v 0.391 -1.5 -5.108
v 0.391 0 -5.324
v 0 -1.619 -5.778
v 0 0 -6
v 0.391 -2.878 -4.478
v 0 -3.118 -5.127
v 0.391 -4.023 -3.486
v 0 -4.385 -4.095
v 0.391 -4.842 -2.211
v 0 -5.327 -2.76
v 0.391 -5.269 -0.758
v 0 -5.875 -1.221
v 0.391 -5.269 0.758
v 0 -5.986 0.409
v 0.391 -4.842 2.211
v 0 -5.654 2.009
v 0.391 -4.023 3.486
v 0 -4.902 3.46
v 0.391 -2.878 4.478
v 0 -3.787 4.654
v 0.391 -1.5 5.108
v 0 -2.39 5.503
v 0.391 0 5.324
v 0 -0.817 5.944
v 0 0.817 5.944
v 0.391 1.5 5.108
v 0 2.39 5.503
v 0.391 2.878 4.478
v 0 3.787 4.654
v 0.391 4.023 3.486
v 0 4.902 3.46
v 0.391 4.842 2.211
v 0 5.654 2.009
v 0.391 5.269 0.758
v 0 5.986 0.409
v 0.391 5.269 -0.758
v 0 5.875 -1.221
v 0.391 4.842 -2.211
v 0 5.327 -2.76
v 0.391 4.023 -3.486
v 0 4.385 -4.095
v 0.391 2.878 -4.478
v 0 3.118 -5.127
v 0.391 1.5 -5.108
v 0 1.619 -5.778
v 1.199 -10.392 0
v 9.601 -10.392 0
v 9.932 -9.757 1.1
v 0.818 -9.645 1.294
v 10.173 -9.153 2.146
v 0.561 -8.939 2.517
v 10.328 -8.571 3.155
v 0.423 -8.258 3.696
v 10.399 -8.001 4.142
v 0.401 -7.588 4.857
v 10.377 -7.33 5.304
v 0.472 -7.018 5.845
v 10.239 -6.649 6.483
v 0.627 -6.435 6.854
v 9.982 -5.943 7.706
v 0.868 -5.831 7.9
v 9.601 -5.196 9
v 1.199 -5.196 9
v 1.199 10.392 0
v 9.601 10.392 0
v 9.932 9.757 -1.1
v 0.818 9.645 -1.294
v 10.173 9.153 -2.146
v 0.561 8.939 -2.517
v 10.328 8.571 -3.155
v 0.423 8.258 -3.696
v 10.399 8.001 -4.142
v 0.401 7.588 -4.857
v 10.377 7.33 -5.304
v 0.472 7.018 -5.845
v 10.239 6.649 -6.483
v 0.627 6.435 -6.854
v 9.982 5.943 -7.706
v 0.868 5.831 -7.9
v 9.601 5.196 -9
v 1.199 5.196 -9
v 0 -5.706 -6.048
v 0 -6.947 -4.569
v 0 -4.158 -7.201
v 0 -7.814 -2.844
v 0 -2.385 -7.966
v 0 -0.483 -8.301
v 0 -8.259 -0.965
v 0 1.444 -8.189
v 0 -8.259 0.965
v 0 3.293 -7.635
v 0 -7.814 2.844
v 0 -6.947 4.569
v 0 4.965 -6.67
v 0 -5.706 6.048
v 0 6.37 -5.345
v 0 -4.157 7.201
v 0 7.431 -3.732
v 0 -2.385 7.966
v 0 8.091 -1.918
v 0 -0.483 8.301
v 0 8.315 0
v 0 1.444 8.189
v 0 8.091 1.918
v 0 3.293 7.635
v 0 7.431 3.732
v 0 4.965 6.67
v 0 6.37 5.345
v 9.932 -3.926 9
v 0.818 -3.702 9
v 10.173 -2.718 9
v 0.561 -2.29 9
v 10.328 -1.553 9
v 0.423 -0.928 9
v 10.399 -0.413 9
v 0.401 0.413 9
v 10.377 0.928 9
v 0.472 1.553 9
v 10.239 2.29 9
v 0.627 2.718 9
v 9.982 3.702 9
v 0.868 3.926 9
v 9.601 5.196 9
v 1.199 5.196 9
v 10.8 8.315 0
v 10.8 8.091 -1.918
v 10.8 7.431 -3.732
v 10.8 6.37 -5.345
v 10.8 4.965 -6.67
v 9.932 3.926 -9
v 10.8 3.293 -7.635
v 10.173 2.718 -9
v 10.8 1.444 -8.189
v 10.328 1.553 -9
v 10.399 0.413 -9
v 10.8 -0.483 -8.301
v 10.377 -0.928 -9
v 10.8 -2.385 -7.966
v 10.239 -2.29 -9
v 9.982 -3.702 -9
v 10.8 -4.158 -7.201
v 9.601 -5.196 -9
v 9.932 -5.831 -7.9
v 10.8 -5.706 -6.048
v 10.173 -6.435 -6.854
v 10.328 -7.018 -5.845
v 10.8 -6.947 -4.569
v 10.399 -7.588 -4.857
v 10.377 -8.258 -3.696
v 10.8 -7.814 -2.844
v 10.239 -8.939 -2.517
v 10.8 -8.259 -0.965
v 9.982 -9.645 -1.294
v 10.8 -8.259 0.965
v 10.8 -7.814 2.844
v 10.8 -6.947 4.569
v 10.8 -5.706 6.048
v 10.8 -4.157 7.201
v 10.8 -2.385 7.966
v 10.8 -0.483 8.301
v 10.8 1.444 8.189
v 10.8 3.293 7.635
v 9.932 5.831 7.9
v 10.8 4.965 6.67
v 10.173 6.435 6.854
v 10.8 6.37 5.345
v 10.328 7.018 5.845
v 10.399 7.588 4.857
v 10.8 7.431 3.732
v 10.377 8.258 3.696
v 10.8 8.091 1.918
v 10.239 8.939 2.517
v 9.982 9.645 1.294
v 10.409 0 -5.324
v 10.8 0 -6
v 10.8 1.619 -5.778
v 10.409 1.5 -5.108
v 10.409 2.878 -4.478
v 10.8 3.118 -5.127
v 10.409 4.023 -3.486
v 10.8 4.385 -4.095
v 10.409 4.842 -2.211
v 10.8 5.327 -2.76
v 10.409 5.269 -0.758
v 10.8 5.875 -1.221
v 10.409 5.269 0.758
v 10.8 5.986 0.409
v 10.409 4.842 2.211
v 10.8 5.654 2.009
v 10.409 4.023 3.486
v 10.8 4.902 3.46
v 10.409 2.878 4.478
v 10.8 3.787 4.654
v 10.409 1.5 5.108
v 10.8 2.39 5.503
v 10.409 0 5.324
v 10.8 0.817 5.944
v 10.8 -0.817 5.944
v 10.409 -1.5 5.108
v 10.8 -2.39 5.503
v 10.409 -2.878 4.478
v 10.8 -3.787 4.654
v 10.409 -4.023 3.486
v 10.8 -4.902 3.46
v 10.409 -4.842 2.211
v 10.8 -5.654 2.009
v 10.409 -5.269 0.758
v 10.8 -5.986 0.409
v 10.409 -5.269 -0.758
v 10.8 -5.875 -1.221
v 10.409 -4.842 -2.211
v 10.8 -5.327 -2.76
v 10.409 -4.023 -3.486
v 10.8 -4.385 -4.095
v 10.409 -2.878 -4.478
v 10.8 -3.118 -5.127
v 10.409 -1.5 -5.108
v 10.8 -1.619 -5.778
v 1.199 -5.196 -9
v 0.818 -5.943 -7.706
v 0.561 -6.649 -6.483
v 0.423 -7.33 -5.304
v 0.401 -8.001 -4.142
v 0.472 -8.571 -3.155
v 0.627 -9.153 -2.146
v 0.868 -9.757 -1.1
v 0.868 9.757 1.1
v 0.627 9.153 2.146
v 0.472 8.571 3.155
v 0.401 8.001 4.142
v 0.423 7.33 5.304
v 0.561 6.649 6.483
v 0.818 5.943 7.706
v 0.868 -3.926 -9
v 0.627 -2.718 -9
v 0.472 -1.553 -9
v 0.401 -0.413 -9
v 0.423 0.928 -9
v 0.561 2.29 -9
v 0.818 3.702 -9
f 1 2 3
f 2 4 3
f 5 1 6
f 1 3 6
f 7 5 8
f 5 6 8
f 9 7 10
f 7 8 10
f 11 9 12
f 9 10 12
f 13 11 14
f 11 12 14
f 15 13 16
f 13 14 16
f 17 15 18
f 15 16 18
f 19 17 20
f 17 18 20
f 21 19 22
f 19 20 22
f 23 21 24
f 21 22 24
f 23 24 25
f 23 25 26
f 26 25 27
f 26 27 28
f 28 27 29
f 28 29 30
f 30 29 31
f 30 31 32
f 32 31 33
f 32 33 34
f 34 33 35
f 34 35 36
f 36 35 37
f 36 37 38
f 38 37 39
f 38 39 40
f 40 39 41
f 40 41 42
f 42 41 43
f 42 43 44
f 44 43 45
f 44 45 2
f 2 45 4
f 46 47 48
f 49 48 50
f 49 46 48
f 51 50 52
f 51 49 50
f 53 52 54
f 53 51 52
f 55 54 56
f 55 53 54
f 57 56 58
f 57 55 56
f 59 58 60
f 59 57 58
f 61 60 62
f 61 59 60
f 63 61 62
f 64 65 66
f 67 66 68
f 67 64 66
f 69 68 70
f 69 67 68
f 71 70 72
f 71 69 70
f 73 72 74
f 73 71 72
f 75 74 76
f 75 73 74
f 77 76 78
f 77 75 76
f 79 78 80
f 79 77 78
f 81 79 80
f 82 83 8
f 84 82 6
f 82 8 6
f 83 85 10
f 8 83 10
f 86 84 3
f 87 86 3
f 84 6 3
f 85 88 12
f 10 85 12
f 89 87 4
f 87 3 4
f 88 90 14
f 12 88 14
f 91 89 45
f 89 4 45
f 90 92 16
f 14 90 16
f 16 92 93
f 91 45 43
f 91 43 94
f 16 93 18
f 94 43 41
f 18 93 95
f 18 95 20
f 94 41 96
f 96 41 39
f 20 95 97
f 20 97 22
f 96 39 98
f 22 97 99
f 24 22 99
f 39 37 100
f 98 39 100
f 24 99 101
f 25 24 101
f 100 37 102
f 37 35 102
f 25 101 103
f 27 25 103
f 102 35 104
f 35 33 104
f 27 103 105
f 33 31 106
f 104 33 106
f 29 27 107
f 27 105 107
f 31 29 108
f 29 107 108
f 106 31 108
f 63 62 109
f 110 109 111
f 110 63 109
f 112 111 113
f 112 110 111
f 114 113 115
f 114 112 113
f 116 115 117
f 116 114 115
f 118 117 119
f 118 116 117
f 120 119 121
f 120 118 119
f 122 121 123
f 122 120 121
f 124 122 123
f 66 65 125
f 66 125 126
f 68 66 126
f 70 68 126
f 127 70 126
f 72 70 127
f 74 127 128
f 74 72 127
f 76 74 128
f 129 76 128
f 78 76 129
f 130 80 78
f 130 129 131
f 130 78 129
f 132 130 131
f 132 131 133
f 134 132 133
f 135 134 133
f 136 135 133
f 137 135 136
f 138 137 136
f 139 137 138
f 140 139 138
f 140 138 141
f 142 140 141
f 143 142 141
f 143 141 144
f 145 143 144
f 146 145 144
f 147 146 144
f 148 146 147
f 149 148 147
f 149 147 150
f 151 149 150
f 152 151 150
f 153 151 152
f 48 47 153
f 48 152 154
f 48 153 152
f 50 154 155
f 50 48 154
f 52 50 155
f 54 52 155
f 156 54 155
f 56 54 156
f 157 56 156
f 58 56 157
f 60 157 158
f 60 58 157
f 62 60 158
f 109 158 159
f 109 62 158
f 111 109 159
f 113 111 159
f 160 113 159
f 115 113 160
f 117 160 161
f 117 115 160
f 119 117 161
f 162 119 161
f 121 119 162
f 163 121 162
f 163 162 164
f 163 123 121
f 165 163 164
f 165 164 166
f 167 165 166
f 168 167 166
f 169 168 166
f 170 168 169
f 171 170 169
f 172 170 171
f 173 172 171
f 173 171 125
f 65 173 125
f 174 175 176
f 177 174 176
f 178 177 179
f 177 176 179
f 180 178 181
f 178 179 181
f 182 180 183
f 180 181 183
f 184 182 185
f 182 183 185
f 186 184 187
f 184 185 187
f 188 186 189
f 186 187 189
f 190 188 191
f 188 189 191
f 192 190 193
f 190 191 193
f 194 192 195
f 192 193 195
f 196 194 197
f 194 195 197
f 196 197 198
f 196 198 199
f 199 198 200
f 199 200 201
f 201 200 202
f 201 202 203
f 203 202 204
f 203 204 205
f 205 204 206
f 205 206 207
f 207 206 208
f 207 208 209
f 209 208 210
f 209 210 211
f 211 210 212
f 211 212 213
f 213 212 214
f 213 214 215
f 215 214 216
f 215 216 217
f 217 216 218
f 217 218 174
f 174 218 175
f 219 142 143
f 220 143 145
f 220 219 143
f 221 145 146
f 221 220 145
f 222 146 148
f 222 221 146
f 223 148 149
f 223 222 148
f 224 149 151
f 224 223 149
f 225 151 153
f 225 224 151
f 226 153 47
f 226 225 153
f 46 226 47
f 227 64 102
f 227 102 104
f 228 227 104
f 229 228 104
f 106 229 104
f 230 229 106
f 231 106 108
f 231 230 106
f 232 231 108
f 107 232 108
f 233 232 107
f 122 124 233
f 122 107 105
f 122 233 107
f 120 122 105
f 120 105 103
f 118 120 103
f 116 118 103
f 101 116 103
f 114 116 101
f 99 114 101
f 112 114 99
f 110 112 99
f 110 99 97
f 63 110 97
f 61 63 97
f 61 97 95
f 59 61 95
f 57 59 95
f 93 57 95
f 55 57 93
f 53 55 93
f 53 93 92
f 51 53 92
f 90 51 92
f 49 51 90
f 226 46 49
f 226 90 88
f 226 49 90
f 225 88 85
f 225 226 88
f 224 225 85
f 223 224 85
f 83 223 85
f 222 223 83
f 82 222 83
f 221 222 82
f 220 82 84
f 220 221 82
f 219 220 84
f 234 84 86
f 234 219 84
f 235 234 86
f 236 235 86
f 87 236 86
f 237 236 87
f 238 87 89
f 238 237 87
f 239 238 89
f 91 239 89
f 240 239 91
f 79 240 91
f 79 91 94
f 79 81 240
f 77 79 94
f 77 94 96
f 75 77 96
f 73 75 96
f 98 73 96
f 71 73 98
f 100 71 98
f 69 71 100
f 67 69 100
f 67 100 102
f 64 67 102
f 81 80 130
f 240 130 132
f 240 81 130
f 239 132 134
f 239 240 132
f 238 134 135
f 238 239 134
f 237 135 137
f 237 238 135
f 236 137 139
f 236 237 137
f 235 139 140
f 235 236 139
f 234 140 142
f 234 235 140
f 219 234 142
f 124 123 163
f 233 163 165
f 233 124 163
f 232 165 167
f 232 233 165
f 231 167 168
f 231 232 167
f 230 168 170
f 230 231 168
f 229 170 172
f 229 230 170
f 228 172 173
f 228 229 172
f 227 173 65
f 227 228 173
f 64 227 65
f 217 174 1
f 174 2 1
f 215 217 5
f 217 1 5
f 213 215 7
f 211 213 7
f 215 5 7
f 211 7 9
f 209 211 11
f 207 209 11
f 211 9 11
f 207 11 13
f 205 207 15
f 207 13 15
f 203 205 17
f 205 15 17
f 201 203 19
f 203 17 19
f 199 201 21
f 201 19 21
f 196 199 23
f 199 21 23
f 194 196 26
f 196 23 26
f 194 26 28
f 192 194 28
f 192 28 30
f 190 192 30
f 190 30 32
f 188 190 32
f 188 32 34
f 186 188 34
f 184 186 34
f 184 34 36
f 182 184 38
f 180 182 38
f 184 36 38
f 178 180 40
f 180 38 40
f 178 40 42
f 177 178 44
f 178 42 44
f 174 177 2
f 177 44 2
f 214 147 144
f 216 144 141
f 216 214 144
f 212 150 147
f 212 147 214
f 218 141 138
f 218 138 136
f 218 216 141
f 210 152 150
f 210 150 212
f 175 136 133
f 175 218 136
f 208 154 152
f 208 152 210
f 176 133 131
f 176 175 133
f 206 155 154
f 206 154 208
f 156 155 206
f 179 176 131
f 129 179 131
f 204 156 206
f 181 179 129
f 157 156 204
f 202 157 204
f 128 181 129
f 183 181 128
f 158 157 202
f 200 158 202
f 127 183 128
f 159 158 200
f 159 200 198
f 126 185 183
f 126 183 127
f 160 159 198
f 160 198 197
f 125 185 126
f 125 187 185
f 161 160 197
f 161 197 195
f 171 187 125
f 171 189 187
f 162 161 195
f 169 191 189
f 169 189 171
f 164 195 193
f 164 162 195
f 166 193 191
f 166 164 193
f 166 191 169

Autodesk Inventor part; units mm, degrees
ref_plane "YZ Plane" through (0, 0, 0) normal (1, 0, 0) x (0, 1, 0)
ref_plane "XZ Plane" through (0, 0, 0) normal (0, 1, 0) x (-1, 0, 0)
sketch "Эскиз1" plane through (0, 0, 0) normal (1, 0, 0) x (0, 1, 0)
  line L0 (-10.3923, 0) -> (-5.1962, 9)
  line L1 (-5.1962, 9) -> (5.1962, 9)
  line L2 (5.1962, 9) -> (10.3923, 0)
  line L3 (10.3923, 0) -> (5.1962, -9)
  line L4 (5.1962, -9) -> (-5.1962, -9)
  line L5 (-5.1962, -9) -> (-10.3923, 0)
  point P0 (0, 0)
  point P1 (0, 0)
  dimension "d0" = 20.7846
extrude "Базовый элемент" add sketch "Эскиз1" along normal blind 10.8
sketch "Эскиз2" plane through (0, 0, 0) normal (0, 0, 1) x (1, 0, 0)
  line L0 (0, 5.1962) -> (0, 10.3923) projected
  line L1 (0, 10.3923) -> (10.8, 10.3923) projected
  line L2 (10.8, 5.1962) -> (10.8, 10.3923) projected
  line L3 (-2.16, 0) -> (12.96, 0) projected
  line L4 (1.1993, 10.3923) -> (0, 8.315)
  line L5 (9.6007, 10.3923) -> (10.8, 8.315)
  dimension "d3" = 30
  dimension "d4" = 30
  dimension "d5" = 16.63
  dimension "d6" = 16.63
revolve "Фаска1" cut sketch "Эскиз2" angle 360 about axis through (-10, 0, 0) along (1, 0, 0)
sketch "Эскиз3" plane through (10.8, 0, 0) normal (1, 0, 0) x (0, 0, -1)
  arc A0 (-0.625, -1.0825) -> (0.625, -1.0825) centre (0, 0) ccw projected
hole "Резьба" at (10.8, 0, 0) direction (-1, 0, 0) diameter 10.647 end through all thread size "M12x1.25" class "6H" standard "ISO Metric profile"
chamfer "Фаска2" distance 0.6766 angle 30 1 edges at (10.8, 0, 5.3235) measured on face at (10.8, 7.2244, -0.8772)
chamfer "Фаска3" distance 0.6766 angle 30 1 edges at (0, 0, 5.3235) measured on face at (0, 7.2244, -0.8772)
ref_plane "Work Plane1" through (-18.9656, 0, 0) normal (0, -0.8660254, -0.5) x (1, 0, 0)
equation "\"d0\" = 1.1547 * SW"
equation "\"d1\" = KOH"
equation "\"d3\" = ANG1"
equation "\"d4\" = ANG2"
equation "\"d5\" = SW0"
equation "\"d6\" = SW01"
equation "\"d8\" = -0.5 * GD1 + 0.5 * NND"
equation "\"d40\" = -0.5 * GD1 + 0.5 * NND"
equation "\"d10\" = -0.5 * GD1 + 0.5 * NND"
equation "\"d41\" = -0.5 * GD1 + 0.5 * NND"
equation "\"ANG1\" = 30deg"
equation "\"ANG2\" = 30deg"
equation "\"NND\" = 12"
equation "\"KOH\" = 10.8"
equation "\"SW\" = 18"
equation "\"SW0\" = 16.63"
equation "\"SW01\" = SW0"
equation "\"GUL\" = 0.541266 * PTC"
equation "\"LADI\" = 16.63"
equation "\"TOA\" = 30deg"
equation "\"FAWI\" = 30deg"
equation "\"PTC\" = 1.25"
equation "\"THREADDIA\" = 12"
equation "\"E0\" = 1.155 * SW"
equation "\"GAL\" = 0.541266 * PTC"
equation "\"GD1\" = 10.646835"
properties part number "Копия гайки M12x1,25-6H ГОСТ 5915-70" material "Сталь, мягкая"
